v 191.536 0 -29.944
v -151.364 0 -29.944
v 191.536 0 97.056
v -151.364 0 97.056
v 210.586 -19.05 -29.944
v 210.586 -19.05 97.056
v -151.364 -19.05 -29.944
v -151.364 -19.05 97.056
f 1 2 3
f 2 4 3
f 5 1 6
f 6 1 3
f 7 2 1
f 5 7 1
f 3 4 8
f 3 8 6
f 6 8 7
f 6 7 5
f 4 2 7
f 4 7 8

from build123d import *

# Parameters (mm, degrees)
F0_W     = 361.95
F0_H     = 127
F1_DEPTH = 19.05
F2_SIZE2 = 19.04999
F2_SIZE  = 19.04999


# Not quite as in the source:
# - a fillet or chamfer is up to 0.001 mm smaller than in the source, because OpenCascade refuses the exact size


with BuildPart() as f1:
    # F0 (on Front) → F1 (new body)
    with BuildSketch(Plane.XZ):
        with Locations((29.6110501051, 33.5559173692)):
            Rectangle(F0_W, F0_H)
    extrude(amount=F1_DEPTH)

    # F2 (size 19.05 and 19.05 in the source; OpenCascade refuses exactly that, so slightly less here)
    f2_edges = [f1.edges().sort_by_distance(p)[0] for p in [
        (210.58605, 0, 33.555917),
    ]]
    chamfer(f2_edges, length=F2_SIZE, length2=F2_SIZE2)


solid = f1.part
